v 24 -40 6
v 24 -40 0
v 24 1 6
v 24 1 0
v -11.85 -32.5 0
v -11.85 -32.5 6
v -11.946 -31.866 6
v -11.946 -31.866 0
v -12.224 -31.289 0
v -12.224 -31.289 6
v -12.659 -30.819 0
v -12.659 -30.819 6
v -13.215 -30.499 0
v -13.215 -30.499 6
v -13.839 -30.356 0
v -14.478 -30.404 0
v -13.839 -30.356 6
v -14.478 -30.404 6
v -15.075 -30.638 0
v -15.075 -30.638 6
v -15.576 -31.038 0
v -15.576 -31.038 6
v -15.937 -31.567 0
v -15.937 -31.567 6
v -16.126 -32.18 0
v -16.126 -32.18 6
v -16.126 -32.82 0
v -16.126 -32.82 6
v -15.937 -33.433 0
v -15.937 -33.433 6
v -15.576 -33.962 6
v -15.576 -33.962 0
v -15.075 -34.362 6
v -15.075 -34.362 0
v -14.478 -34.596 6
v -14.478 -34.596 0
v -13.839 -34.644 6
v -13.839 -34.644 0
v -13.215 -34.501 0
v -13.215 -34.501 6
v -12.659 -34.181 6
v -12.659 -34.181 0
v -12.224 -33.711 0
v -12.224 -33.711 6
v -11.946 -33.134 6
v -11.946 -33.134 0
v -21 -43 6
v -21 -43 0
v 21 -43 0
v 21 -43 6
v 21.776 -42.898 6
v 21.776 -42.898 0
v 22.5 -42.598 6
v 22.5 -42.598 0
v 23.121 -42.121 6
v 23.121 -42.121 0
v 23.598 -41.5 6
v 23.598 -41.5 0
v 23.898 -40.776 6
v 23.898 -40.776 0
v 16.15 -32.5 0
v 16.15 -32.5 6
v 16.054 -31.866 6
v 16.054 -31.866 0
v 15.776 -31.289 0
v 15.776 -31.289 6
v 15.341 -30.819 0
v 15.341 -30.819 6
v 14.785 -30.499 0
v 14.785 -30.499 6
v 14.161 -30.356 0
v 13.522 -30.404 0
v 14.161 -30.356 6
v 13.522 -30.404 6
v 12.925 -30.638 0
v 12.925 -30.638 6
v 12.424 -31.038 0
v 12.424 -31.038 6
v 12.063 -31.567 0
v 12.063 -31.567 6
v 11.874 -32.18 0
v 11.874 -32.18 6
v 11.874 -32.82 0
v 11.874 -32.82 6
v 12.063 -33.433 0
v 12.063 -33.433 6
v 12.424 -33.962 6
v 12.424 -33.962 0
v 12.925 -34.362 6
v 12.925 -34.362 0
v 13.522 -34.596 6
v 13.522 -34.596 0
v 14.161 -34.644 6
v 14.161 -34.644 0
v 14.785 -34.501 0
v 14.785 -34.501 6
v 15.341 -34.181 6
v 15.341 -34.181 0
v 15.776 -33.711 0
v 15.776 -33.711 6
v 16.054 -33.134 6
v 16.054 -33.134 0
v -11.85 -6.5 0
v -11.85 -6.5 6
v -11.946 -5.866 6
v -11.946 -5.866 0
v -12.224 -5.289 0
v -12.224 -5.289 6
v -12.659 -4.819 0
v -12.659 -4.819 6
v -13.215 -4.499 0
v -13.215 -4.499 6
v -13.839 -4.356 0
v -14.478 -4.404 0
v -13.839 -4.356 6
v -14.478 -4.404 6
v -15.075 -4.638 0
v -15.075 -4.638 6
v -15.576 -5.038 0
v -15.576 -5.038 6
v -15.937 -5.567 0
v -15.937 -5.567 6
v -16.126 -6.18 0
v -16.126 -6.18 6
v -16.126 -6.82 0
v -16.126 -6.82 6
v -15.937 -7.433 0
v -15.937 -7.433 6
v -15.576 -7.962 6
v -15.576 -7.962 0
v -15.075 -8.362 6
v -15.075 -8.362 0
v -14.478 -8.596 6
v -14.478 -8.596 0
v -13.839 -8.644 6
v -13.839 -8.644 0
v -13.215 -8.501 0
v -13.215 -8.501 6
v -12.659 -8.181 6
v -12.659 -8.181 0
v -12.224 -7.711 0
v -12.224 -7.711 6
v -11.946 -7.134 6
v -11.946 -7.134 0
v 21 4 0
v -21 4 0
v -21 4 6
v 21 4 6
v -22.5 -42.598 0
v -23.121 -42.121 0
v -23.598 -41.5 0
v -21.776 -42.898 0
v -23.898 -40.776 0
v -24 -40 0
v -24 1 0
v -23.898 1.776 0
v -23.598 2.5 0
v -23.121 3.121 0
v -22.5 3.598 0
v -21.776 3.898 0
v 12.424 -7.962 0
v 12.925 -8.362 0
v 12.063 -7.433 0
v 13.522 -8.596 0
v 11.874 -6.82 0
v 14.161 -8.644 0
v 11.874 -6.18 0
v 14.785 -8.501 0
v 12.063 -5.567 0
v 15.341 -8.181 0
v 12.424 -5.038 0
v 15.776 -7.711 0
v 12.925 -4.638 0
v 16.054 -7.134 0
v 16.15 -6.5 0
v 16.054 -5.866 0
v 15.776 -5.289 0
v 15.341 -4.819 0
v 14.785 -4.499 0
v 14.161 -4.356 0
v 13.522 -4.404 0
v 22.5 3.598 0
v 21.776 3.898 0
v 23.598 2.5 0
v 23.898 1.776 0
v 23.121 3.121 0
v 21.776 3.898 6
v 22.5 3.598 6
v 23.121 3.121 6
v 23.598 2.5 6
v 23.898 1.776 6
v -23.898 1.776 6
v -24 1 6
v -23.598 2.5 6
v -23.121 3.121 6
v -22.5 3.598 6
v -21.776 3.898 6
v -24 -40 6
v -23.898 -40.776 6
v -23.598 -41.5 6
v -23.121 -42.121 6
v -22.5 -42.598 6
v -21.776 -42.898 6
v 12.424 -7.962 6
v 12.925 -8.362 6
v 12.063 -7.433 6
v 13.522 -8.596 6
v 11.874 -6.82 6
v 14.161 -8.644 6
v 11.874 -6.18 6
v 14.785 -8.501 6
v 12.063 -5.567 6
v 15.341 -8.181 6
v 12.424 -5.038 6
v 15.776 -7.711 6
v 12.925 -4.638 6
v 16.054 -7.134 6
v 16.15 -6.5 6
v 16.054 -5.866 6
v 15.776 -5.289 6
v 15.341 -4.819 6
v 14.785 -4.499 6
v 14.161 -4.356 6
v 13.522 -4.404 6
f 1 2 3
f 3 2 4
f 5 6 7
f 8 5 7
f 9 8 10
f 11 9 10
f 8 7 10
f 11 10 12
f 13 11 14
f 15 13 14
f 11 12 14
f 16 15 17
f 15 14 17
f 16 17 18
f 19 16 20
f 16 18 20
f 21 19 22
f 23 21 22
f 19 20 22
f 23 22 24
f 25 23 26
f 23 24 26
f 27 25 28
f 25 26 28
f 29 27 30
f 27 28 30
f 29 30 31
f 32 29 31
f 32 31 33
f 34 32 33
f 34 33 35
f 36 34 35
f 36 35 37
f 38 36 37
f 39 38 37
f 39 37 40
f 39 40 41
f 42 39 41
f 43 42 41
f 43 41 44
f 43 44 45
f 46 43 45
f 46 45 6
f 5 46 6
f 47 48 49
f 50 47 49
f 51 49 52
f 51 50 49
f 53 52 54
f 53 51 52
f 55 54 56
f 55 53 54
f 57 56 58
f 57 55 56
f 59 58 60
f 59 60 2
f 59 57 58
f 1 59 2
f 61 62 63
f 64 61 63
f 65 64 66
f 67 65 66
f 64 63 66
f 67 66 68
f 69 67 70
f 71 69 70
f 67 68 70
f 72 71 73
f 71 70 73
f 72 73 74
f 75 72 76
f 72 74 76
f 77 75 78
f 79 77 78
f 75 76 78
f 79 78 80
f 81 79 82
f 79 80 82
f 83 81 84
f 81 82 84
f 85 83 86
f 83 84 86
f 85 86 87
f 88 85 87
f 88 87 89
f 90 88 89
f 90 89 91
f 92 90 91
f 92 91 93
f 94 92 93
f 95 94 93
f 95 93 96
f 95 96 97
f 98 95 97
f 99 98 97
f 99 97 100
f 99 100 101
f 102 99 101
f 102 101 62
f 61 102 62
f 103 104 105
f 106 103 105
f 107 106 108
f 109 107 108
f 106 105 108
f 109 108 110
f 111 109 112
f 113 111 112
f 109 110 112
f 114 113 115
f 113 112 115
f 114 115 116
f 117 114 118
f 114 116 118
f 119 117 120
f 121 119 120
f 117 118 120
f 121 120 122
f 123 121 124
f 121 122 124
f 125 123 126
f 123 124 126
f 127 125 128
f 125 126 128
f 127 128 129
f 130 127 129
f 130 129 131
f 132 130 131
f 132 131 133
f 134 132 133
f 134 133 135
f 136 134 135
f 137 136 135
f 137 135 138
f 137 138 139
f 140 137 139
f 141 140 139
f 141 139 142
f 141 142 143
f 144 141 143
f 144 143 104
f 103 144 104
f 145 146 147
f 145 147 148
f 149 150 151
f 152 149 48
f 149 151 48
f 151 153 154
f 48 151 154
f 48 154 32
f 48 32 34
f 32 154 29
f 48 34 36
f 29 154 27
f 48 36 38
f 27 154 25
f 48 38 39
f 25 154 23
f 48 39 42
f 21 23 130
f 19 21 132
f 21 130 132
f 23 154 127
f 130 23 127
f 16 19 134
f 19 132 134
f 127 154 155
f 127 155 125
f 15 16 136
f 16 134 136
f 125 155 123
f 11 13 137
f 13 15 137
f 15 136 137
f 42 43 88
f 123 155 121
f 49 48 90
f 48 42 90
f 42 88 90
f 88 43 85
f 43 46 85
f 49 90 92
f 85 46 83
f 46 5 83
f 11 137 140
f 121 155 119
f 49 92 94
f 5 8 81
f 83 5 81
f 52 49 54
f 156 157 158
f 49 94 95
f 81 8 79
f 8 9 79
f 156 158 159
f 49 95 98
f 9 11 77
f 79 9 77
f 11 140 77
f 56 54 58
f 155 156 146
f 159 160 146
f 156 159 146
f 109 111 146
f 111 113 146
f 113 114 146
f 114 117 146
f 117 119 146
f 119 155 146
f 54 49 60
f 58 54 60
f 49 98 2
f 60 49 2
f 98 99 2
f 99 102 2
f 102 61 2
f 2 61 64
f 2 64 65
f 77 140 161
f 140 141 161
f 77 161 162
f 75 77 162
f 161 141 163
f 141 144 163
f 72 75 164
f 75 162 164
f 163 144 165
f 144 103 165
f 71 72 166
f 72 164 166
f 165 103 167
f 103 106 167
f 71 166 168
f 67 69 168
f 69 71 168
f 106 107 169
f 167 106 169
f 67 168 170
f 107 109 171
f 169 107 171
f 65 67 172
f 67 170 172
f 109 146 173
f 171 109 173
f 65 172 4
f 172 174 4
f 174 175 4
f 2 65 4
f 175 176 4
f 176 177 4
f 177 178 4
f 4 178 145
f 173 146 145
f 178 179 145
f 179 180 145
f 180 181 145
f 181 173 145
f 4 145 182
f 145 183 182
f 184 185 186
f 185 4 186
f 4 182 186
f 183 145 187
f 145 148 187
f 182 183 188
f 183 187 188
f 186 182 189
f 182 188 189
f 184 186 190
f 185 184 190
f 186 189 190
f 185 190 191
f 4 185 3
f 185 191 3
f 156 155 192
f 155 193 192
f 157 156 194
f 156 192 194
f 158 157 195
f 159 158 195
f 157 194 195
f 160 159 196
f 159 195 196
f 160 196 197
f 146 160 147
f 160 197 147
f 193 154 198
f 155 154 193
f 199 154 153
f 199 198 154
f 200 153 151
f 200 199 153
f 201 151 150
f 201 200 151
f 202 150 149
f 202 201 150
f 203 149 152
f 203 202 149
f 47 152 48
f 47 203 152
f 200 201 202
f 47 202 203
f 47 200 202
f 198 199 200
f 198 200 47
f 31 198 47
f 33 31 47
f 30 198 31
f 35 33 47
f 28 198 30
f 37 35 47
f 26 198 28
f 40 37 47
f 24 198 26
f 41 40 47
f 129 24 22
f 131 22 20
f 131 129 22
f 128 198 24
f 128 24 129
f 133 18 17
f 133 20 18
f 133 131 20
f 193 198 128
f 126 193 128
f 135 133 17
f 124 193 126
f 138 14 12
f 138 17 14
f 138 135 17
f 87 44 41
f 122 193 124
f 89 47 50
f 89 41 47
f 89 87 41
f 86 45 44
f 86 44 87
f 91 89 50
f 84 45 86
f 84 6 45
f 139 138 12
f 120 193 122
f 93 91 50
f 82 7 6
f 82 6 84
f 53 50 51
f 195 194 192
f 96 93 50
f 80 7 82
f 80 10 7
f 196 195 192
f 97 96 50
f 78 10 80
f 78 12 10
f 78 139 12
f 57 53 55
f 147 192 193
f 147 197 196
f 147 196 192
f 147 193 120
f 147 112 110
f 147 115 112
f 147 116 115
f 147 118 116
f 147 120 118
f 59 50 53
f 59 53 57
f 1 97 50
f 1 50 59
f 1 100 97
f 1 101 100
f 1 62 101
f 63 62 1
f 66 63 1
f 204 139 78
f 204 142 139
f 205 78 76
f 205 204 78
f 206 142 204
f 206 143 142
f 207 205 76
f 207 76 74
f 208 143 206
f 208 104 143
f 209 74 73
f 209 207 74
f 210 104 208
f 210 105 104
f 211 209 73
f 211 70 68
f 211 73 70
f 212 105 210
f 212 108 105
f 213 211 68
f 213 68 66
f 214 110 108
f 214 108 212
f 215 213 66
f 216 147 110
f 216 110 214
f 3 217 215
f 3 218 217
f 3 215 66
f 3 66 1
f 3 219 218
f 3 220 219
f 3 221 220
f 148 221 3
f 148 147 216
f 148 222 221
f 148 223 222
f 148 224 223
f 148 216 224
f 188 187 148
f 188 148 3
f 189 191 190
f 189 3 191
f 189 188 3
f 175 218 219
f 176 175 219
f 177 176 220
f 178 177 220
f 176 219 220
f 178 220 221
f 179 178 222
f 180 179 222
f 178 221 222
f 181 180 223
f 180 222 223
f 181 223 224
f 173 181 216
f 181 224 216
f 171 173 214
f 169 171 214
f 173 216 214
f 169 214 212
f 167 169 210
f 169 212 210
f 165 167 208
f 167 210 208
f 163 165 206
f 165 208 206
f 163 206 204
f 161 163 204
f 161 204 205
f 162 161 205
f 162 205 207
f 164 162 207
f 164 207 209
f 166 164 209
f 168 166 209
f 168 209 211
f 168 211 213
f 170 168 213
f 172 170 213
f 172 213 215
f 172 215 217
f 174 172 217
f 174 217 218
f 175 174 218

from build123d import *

# Parameters (mm, degrees)
SKETCH1_W           = 48
SKETCH1_H           = 47
SKETCH1_R           = 1.65
BOSS_EXTRUDE1_DEPTH = 6
SKETCH2_R           = 2.15
CUT_EXTRUDE1_DEPTH  = 7
FILLET1_R           = 3


with BuildPart() as part:
    # Sketch1 → Boss-Extrude1 (new body)
    with BuildSketch(Plane.XY):
        with Locations((0, -19.5)):
            Rectangle(SKETCH1_W, SKETCH1_H)
        with Locations((14, -32.5)):
            Circle(SKETCH1_R, mode=Mode.SUBTRACT)
        with Locations((-14, -32.5)):
            Circle(SKETCH1_R, mode=Mode.SUBTRACT)
        with Locations((-14, -6.5)):
            Circle(SKETCH1_R, mode=Mode.SUBTRACT)
        with Locations((14, -6.5)):
            Circle(SKETCH1_R, mode=Mode.SUBTRACT)
    extrude(amount=BOSS_EXTRUDE1_DEPTH)

    # Sketch2 → Cut-Extrude1 (cut, through all)
    with BuildSketch(Plane.XY.offset(6)):
        with Locations((-14, -6.5)):
            Circle(SKETCH2_R)
        with Locations((14, -6.5)):
            Circle(SKETCH2_R)
        with Locations((-14, -32.5)):
            Circle(SKETCH2_R)
        with Locations((14, -32.5)):
            Circle(SKETCH2_R)
    extrude(amount=-CUT_EXTRUDE1_DEPTH, mode=Mode.SUBTRACT)

    # Fillet1
    fillet1_edges = [part.edges().sort_by_distance(p)[0] for p in [
        (24, -43, 3),
        (-24, -43, 3),
        (-24, 4, 3),
        (24, 4, 3),
    ]]
    fillet(fillet1_edges, radius=FILLET1_R)


solid = part.part
